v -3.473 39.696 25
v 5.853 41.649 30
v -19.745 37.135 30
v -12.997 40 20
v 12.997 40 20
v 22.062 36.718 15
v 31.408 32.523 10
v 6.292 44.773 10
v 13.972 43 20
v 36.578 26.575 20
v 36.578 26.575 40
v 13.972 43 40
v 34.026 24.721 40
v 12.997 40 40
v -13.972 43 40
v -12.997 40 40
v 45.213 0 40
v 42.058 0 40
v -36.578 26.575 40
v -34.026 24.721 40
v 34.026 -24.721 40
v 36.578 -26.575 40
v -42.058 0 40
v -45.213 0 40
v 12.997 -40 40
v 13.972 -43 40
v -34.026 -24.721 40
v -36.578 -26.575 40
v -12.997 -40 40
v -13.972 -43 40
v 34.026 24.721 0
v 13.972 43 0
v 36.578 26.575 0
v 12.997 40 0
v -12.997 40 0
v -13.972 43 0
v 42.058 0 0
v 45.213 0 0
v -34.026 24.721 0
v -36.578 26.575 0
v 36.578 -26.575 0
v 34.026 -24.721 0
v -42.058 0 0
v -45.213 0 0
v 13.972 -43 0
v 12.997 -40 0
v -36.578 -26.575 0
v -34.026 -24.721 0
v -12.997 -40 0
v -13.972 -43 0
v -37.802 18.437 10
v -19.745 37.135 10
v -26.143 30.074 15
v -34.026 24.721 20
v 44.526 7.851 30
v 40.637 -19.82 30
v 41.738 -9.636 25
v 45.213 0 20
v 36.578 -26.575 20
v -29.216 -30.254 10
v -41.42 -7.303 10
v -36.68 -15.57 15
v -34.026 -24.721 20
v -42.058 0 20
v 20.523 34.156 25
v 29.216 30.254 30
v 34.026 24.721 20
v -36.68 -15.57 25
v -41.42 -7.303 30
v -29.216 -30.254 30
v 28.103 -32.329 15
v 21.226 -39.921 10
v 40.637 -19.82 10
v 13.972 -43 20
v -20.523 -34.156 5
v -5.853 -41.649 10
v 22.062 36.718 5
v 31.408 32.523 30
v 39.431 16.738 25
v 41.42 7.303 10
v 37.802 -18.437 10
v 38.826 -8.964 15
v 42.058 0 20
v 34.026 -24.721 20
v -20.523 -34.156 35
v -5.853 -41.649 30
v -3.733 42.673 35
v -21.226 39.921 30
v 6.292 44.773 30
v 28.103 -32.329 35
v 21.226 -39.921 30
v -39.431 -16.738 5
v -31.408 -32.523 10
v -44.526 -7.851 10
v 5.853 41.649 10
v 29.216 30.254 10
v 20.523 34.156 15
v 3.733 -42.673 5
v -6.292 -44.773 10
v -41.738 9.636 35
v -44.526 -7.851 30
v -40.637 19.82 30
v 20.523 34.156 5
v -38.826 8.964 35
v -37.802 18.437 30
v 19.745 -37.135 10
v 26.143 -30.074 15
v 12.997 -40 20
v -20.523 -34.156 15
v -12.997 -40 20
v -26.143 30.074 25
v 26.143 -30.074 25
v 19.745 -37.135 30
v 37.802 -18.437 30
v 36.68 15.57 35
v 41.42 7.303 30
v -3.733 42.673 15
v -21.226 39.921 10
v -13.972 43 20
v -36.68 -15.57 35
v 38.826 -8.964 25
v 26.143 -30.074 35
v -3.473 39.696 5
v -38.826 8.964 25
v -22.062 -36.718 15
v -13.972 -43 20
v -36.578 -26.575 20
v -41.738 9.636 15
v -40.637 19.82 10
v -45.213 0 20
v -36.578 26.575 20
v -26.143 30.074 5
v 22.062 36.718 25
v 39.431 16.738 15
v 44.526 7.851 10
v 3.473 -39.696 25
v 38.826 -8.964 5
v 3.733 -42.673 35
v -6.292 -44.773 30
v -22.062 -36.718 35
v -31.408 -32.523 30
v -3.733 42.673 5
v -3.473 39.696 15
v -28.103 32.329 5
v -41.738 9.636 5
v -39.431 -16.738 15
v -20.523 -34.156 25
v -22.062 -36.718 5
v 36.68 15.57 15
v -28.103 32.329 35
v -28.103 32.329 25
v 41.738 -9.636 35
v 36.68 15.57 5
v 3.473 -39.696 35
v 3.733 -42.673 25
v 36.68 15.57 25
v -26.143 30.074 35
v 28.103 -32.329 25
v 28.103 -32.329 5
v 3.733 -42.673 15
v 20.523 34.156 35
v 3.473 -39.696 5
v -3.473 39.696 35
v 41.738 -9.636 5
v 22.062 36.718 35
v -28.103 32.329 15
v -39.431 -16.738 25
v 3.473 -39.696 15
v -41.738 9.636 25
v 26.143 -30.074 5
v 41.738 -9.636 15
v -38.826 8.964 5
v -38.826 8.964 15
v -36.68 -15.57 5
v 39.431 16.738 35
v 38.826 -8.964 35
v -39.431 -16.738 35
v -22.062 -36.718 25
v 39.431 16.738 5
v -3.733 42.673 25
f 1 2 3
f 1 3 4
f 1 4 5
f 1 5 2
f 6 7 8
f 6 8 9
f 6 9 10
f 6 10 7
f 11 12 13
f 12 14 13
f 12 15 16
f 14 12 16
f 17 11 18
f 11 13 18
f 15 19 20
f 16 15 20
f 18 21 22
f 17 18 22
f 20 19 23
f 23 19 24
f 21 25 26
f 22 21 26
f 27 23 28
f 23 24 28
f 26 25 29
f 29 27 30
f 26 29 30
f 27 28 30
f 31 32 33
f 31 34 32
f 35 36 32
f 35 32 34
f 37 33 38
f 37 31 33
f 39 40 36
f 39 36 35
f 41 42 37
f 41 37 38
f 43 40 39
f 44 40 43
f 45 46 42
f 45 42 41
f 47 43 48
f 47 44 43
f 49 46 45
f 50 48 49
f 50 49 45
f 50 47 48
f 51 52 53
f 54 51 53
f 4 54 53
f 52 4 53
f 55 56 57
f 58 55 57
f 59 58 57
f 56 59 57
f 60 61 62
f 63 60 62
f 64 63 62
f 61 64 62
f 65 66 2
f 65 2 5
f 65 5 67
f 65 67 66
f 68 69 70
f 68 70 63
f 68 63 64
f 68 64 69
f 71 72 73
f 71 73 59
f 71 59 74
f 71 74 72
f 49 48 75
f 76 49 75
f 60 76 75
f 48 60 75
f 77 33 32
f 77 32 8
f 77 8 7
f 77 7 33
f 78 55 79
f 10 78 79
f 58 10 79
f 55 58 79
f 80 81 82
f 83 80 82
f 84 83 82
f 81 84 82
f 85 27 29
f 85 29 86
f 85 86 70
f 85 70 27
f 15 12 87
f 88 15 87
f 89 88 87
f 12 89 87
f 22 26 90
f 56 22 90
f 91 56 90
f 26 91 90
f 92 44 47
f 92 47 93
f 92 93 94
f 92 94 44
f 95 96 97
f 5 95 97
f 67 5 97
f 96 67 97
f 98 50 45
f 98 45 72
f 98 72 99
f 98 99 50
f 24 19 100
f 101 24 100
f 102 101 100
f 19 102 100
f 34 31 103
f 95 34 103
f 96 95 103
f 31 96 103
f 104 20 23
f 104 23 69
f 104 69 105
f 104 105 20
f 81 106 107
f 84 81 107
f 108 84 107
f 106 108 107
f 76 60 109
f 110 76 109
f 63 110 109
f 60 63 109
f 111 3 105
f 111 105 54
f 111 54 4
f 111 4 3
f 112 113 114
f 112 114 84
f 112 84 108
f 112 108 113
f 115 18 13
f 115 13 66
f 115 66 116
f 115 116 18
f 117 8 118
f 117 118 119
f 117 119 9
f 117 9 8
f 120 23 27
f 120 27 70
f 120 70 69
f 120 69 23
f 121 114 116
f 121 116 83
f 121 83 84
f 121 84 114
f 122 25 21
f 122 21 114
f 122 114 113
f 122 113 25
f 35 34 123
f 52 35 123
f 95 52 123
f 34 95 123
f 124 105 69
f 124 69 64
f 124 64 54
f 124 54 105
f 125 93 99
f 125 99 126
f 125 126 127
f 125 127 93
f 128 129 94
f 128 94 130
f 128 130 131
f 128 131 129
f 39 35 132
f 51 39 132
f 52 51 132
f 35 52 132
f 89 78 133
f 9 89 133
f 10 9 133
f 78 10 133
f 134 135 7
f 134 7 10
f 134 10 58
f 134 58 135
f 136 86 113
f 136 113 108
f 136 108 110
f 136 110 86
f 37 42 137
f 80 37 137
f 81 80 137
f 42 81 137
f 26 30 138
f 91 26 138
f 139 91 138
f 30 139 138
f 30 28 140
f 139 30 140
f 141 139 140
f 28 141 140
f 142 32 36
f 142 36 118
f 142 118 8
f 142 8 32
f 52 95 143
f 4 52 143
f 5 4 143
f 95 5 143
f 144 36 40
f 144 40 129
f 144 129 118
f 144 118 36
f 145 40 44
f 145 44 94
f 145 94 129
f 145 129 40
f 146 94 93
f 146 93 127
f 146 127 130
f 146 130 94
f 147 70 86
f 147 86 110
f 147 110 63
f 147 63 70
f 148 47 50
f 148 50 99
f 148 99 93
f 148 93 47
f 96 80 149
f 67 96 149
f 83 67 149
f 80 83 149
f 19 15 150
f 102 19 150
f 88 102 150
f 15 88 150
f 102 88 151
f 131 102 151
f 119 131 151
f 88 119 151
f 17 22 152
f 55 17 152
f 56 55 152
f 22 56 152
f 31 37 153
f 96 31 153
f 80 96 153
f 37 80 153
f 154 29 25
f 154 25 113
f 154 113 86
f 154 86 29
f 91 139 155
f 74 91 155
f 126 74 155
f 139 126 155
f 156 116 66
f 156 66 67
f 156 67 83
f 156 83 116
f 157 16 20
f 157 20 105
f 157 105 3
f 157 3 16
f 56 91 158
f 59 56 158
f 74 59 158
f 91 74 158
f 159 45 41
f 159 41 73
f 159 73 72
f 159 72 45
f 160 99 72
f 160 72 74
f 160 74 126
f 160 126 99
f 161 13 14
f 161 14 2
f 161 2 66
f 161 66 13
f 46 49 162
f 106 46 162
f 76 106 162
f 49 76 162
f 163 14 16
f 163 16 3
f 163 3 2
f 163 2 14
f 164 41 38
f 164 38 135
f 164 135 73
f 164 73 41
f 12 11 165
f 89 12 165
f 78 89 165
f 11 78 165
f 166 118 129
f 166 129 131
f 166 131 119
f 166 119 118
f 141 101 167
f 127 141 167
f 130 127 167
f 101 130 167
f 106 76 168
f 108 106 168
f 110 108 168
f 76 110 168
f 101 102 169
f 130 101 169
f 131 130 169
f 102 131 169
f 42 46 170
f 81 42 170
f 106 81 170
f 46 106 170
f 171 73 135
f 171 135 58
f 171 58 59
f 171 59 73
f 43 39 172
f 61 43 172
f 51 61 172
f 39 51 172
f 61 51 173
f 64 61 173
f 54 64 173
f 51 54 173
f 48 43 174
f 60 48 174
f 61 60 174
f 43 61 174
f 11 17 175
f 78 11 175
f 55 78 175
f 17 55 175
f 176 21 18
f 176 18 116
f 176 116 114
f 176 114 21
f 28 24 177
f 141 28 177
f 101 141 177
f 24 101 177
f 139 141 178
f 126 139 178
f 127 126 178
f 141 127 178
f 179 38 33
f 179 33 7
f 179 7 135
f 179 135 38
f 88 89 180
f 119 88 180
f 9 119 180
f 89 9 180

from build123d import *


with BuildPart() as f5:
    # F0 (on Top) → F5 section 0
    with BuildSketch(Plane.XY):
        Polygon((12.9967878493, 40), (-12.9967878493, 40), (-34.0260323341, 24.72135955), (-42.0584889695, 0), (-34.0260323341, -24.72135955), (-12.9967878493, -40), (12.9967878493, -40), (34.0260323341, -24.72135955), (42.0584889695, 0), (34.0260323341, 24.72135955), align=None)
    # F3 (on offset) → F5 section 1
    with BuildSketch(Plane.XY.offset(10)):
        Polygon((-29.2162814115, -30.2543450579), (-5.8534103316, -41.649178646), (19.7452645449, -37.1354415949), (37.8019194822, -18.4372280418), (41.4195260172, 7.303379965), (29.2162814115, 30.2543450579), (5.8534103316, 41.649178646), (-19.7452645449, 37.1354415949), (-37.8019194822, 18.4372280418), (-41.4195260172, -7.303379965), align=None)
    loft()


with BuildPart() as f6:
    # F1 (on Top) → F6 section 0
    with BuildSketch(Plane.XY):
        Polygon((-13.971546938, 43), (-36.5779847591, 26.5754615162), (-45.2128756422, 0), (-36.5779847591, -26.5754615162), (-13.971546938, -43), (13.971546938, -43), (36.5779847591, -26.5754615162), (45.2128756422, 0), (36.5779847591, 26.5754615162), (13.971546938, 43), align=None)
    # F4 (on offset) → F6 section 1
    with BuildSketch(Plane.XY.offset(10)):
        Polygon((-21.2261593858, 39.9205997146), (-40.6370634433, 19.8200201449), (-44.5259904685, -7.8511334624), (-31.4075025174, -32.5234209372), (-6.2924161065, -44.7728670445), (21.2261593858, -39.9205997146), (40.6370634433, -19.8200201449), (44.5259904685, 7.8511334624), (31.4075025174, 32.5234209372), (6.2924161065, 44.7728670445), align=None)
    loft()

    # F7: cut F5
    add(f5.part, mode=Mode.SUBTRACT)

    # F11 (on face) → F14 section 0
    with BuildSketch(Plane.XY.offset(10)):
        Polygon((-44.5259904685, -7.8511334624), (-31.4075025174, -32.5234209372), (-6.2924161065, -44.7728670445), (21.2261593858, -39.9205997146), (40.6370634433, -19.8200201449), (44.5259904685, 7.8511334624), (31.4075025174, 32.5234209372), (6.2924161065, 44.7728670445), (-21.2261593858, 39.9205997146), (-40.6370634433, 19.8200201449), align=None)
    # F10 (on offset) → F14 section 1
    with BuildSketch(Plane.XY.offset(20)):
        Polygon((-13.971546938, 43), (-36.5779847591, 26.5754615162), (-45.2128756422, 0), (-36.5779847591, -26.5754615162), (-13.971546938, -43), (13.971546938, -43), (36.5779847591, -26.5754615162), (45.2128756422, 0), (36.5779847591, 26.5754615162), (13.971546938, 43), align=None)
    loft()


with BuildPart() as f13:
    # F12 (on offset) → F13 section 0
    with BuildSketch(Plane.XY.offset(10)):
        Polygon((-19.7452645449, 37.1354415949), (-37.8019194822, 18.4372280418), (-41.4195260172, -7.303379965), (-29.2162814115, -30.2543450579), (-5.8534103316, -41.649178646), (19.7452645449, -37.1354415949), (37.8019194822, -18.4372280418), (41.4195260172, 7.303379965), (29.2162814115, 30.2543450579), (5.8534103316, 41.649178646), align=None)
    # F9 (on offset) → F13 section 1
    with BuildSketch(Plane.XY.offset(20)):
        Polygon((12.9967878493, 40), (-12.9967878493, 40), (-34.0260323341, 24.72135955), (-42.0584889695, 0), (-34.0260323341, -24.72135955), (-12.9967878493, -40), (12.9967878493, -40), (34.0260323341, -24.72135955), (42.0584889695, 0), (34.0260323341, 24.72135955), align=None)
    loft()


with BuildPart() as f6_1:
    add(f6.part)

    # F15: cut F13
    add(f13.part, mode=Mode.SUBTRACT)

    # F16: F6 across face


with BuildPart() as f6_2:
    add(f6_1.part)
    add(f6_1.part.mirror(Plane.XY.offset(20)))


solid = f6_2.part
